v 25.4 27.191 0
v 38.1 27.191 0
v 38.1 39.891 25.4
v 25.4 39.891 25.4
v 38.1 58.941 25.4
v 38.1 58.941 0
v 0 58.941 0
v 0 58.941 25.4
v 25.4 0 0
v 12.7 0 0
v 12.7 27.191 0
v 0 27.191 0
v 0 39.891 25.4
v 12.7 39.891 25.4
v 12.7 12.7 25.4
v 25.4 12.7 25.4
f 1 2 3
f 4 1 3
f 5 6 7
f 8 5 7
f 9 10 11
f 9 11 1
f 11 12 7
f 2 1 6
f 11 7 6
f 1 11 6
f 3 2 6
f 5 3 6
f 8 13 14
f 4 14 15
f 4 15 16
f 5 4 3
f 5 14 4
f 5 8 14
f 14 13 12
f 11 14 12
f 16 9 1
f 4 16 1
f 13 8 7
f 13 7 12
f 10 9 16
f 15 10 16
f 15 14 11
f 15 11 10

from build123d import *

# Parameters (mm, degrees)
F1_DEPTH = 25.4
F5_DEPTH = 12.7
F6_DEPTH = 25.4
F7_DEPTH = 12.7


with BuildPart() as f1:
    # F0 (on Top) → F1 (new body)
    with BuildSketch(Plane.XY):
        Polygon((12.7, 27.191021), (12.7, 0), (25.4, 0), (25.4, 27.191021), (38.1, 27.191021), (38.1, 58.941021), (0, 58.941021), (0, 27.191021), align=None)
    extrude(amount=F1_DEPTH)

    # F3 (on face) → F5 (cut)
    with BuildSketch(Plane.YZ.offset(38.1)):
        Polygon((27.191021, 25.4), (27.191021, 0), (39.891021, 25.4), align=None)
    extrude(amount=-F5_DEPTH, mode=Mode.SUBTRACT)

    # F2 (on face) → F6 (cut)
    with BuildSketch(Plane.YZ.offset(25.4)):
        Polygon((0, 25.4), (0, 0), (12.7, 25.4), align=None)
    extrude(amount=-F6_DEPTH, mode=Mode.SUBTRACT)

    # F4 (on face) → F7 (cut)
    with BuildSketch(Plane(origin=(0, 0, 0), x_dir=(0, -1, 0), z_dir=(-1, 0, 0))):
        Polygon((-27.191021, 25.4), (-39.891021, 25.4), (-27.191021, 0), align=None)
    extrude(amount=-F7_DEPTH, mode=Mode.SUBTRACT)


solid = f1.part
